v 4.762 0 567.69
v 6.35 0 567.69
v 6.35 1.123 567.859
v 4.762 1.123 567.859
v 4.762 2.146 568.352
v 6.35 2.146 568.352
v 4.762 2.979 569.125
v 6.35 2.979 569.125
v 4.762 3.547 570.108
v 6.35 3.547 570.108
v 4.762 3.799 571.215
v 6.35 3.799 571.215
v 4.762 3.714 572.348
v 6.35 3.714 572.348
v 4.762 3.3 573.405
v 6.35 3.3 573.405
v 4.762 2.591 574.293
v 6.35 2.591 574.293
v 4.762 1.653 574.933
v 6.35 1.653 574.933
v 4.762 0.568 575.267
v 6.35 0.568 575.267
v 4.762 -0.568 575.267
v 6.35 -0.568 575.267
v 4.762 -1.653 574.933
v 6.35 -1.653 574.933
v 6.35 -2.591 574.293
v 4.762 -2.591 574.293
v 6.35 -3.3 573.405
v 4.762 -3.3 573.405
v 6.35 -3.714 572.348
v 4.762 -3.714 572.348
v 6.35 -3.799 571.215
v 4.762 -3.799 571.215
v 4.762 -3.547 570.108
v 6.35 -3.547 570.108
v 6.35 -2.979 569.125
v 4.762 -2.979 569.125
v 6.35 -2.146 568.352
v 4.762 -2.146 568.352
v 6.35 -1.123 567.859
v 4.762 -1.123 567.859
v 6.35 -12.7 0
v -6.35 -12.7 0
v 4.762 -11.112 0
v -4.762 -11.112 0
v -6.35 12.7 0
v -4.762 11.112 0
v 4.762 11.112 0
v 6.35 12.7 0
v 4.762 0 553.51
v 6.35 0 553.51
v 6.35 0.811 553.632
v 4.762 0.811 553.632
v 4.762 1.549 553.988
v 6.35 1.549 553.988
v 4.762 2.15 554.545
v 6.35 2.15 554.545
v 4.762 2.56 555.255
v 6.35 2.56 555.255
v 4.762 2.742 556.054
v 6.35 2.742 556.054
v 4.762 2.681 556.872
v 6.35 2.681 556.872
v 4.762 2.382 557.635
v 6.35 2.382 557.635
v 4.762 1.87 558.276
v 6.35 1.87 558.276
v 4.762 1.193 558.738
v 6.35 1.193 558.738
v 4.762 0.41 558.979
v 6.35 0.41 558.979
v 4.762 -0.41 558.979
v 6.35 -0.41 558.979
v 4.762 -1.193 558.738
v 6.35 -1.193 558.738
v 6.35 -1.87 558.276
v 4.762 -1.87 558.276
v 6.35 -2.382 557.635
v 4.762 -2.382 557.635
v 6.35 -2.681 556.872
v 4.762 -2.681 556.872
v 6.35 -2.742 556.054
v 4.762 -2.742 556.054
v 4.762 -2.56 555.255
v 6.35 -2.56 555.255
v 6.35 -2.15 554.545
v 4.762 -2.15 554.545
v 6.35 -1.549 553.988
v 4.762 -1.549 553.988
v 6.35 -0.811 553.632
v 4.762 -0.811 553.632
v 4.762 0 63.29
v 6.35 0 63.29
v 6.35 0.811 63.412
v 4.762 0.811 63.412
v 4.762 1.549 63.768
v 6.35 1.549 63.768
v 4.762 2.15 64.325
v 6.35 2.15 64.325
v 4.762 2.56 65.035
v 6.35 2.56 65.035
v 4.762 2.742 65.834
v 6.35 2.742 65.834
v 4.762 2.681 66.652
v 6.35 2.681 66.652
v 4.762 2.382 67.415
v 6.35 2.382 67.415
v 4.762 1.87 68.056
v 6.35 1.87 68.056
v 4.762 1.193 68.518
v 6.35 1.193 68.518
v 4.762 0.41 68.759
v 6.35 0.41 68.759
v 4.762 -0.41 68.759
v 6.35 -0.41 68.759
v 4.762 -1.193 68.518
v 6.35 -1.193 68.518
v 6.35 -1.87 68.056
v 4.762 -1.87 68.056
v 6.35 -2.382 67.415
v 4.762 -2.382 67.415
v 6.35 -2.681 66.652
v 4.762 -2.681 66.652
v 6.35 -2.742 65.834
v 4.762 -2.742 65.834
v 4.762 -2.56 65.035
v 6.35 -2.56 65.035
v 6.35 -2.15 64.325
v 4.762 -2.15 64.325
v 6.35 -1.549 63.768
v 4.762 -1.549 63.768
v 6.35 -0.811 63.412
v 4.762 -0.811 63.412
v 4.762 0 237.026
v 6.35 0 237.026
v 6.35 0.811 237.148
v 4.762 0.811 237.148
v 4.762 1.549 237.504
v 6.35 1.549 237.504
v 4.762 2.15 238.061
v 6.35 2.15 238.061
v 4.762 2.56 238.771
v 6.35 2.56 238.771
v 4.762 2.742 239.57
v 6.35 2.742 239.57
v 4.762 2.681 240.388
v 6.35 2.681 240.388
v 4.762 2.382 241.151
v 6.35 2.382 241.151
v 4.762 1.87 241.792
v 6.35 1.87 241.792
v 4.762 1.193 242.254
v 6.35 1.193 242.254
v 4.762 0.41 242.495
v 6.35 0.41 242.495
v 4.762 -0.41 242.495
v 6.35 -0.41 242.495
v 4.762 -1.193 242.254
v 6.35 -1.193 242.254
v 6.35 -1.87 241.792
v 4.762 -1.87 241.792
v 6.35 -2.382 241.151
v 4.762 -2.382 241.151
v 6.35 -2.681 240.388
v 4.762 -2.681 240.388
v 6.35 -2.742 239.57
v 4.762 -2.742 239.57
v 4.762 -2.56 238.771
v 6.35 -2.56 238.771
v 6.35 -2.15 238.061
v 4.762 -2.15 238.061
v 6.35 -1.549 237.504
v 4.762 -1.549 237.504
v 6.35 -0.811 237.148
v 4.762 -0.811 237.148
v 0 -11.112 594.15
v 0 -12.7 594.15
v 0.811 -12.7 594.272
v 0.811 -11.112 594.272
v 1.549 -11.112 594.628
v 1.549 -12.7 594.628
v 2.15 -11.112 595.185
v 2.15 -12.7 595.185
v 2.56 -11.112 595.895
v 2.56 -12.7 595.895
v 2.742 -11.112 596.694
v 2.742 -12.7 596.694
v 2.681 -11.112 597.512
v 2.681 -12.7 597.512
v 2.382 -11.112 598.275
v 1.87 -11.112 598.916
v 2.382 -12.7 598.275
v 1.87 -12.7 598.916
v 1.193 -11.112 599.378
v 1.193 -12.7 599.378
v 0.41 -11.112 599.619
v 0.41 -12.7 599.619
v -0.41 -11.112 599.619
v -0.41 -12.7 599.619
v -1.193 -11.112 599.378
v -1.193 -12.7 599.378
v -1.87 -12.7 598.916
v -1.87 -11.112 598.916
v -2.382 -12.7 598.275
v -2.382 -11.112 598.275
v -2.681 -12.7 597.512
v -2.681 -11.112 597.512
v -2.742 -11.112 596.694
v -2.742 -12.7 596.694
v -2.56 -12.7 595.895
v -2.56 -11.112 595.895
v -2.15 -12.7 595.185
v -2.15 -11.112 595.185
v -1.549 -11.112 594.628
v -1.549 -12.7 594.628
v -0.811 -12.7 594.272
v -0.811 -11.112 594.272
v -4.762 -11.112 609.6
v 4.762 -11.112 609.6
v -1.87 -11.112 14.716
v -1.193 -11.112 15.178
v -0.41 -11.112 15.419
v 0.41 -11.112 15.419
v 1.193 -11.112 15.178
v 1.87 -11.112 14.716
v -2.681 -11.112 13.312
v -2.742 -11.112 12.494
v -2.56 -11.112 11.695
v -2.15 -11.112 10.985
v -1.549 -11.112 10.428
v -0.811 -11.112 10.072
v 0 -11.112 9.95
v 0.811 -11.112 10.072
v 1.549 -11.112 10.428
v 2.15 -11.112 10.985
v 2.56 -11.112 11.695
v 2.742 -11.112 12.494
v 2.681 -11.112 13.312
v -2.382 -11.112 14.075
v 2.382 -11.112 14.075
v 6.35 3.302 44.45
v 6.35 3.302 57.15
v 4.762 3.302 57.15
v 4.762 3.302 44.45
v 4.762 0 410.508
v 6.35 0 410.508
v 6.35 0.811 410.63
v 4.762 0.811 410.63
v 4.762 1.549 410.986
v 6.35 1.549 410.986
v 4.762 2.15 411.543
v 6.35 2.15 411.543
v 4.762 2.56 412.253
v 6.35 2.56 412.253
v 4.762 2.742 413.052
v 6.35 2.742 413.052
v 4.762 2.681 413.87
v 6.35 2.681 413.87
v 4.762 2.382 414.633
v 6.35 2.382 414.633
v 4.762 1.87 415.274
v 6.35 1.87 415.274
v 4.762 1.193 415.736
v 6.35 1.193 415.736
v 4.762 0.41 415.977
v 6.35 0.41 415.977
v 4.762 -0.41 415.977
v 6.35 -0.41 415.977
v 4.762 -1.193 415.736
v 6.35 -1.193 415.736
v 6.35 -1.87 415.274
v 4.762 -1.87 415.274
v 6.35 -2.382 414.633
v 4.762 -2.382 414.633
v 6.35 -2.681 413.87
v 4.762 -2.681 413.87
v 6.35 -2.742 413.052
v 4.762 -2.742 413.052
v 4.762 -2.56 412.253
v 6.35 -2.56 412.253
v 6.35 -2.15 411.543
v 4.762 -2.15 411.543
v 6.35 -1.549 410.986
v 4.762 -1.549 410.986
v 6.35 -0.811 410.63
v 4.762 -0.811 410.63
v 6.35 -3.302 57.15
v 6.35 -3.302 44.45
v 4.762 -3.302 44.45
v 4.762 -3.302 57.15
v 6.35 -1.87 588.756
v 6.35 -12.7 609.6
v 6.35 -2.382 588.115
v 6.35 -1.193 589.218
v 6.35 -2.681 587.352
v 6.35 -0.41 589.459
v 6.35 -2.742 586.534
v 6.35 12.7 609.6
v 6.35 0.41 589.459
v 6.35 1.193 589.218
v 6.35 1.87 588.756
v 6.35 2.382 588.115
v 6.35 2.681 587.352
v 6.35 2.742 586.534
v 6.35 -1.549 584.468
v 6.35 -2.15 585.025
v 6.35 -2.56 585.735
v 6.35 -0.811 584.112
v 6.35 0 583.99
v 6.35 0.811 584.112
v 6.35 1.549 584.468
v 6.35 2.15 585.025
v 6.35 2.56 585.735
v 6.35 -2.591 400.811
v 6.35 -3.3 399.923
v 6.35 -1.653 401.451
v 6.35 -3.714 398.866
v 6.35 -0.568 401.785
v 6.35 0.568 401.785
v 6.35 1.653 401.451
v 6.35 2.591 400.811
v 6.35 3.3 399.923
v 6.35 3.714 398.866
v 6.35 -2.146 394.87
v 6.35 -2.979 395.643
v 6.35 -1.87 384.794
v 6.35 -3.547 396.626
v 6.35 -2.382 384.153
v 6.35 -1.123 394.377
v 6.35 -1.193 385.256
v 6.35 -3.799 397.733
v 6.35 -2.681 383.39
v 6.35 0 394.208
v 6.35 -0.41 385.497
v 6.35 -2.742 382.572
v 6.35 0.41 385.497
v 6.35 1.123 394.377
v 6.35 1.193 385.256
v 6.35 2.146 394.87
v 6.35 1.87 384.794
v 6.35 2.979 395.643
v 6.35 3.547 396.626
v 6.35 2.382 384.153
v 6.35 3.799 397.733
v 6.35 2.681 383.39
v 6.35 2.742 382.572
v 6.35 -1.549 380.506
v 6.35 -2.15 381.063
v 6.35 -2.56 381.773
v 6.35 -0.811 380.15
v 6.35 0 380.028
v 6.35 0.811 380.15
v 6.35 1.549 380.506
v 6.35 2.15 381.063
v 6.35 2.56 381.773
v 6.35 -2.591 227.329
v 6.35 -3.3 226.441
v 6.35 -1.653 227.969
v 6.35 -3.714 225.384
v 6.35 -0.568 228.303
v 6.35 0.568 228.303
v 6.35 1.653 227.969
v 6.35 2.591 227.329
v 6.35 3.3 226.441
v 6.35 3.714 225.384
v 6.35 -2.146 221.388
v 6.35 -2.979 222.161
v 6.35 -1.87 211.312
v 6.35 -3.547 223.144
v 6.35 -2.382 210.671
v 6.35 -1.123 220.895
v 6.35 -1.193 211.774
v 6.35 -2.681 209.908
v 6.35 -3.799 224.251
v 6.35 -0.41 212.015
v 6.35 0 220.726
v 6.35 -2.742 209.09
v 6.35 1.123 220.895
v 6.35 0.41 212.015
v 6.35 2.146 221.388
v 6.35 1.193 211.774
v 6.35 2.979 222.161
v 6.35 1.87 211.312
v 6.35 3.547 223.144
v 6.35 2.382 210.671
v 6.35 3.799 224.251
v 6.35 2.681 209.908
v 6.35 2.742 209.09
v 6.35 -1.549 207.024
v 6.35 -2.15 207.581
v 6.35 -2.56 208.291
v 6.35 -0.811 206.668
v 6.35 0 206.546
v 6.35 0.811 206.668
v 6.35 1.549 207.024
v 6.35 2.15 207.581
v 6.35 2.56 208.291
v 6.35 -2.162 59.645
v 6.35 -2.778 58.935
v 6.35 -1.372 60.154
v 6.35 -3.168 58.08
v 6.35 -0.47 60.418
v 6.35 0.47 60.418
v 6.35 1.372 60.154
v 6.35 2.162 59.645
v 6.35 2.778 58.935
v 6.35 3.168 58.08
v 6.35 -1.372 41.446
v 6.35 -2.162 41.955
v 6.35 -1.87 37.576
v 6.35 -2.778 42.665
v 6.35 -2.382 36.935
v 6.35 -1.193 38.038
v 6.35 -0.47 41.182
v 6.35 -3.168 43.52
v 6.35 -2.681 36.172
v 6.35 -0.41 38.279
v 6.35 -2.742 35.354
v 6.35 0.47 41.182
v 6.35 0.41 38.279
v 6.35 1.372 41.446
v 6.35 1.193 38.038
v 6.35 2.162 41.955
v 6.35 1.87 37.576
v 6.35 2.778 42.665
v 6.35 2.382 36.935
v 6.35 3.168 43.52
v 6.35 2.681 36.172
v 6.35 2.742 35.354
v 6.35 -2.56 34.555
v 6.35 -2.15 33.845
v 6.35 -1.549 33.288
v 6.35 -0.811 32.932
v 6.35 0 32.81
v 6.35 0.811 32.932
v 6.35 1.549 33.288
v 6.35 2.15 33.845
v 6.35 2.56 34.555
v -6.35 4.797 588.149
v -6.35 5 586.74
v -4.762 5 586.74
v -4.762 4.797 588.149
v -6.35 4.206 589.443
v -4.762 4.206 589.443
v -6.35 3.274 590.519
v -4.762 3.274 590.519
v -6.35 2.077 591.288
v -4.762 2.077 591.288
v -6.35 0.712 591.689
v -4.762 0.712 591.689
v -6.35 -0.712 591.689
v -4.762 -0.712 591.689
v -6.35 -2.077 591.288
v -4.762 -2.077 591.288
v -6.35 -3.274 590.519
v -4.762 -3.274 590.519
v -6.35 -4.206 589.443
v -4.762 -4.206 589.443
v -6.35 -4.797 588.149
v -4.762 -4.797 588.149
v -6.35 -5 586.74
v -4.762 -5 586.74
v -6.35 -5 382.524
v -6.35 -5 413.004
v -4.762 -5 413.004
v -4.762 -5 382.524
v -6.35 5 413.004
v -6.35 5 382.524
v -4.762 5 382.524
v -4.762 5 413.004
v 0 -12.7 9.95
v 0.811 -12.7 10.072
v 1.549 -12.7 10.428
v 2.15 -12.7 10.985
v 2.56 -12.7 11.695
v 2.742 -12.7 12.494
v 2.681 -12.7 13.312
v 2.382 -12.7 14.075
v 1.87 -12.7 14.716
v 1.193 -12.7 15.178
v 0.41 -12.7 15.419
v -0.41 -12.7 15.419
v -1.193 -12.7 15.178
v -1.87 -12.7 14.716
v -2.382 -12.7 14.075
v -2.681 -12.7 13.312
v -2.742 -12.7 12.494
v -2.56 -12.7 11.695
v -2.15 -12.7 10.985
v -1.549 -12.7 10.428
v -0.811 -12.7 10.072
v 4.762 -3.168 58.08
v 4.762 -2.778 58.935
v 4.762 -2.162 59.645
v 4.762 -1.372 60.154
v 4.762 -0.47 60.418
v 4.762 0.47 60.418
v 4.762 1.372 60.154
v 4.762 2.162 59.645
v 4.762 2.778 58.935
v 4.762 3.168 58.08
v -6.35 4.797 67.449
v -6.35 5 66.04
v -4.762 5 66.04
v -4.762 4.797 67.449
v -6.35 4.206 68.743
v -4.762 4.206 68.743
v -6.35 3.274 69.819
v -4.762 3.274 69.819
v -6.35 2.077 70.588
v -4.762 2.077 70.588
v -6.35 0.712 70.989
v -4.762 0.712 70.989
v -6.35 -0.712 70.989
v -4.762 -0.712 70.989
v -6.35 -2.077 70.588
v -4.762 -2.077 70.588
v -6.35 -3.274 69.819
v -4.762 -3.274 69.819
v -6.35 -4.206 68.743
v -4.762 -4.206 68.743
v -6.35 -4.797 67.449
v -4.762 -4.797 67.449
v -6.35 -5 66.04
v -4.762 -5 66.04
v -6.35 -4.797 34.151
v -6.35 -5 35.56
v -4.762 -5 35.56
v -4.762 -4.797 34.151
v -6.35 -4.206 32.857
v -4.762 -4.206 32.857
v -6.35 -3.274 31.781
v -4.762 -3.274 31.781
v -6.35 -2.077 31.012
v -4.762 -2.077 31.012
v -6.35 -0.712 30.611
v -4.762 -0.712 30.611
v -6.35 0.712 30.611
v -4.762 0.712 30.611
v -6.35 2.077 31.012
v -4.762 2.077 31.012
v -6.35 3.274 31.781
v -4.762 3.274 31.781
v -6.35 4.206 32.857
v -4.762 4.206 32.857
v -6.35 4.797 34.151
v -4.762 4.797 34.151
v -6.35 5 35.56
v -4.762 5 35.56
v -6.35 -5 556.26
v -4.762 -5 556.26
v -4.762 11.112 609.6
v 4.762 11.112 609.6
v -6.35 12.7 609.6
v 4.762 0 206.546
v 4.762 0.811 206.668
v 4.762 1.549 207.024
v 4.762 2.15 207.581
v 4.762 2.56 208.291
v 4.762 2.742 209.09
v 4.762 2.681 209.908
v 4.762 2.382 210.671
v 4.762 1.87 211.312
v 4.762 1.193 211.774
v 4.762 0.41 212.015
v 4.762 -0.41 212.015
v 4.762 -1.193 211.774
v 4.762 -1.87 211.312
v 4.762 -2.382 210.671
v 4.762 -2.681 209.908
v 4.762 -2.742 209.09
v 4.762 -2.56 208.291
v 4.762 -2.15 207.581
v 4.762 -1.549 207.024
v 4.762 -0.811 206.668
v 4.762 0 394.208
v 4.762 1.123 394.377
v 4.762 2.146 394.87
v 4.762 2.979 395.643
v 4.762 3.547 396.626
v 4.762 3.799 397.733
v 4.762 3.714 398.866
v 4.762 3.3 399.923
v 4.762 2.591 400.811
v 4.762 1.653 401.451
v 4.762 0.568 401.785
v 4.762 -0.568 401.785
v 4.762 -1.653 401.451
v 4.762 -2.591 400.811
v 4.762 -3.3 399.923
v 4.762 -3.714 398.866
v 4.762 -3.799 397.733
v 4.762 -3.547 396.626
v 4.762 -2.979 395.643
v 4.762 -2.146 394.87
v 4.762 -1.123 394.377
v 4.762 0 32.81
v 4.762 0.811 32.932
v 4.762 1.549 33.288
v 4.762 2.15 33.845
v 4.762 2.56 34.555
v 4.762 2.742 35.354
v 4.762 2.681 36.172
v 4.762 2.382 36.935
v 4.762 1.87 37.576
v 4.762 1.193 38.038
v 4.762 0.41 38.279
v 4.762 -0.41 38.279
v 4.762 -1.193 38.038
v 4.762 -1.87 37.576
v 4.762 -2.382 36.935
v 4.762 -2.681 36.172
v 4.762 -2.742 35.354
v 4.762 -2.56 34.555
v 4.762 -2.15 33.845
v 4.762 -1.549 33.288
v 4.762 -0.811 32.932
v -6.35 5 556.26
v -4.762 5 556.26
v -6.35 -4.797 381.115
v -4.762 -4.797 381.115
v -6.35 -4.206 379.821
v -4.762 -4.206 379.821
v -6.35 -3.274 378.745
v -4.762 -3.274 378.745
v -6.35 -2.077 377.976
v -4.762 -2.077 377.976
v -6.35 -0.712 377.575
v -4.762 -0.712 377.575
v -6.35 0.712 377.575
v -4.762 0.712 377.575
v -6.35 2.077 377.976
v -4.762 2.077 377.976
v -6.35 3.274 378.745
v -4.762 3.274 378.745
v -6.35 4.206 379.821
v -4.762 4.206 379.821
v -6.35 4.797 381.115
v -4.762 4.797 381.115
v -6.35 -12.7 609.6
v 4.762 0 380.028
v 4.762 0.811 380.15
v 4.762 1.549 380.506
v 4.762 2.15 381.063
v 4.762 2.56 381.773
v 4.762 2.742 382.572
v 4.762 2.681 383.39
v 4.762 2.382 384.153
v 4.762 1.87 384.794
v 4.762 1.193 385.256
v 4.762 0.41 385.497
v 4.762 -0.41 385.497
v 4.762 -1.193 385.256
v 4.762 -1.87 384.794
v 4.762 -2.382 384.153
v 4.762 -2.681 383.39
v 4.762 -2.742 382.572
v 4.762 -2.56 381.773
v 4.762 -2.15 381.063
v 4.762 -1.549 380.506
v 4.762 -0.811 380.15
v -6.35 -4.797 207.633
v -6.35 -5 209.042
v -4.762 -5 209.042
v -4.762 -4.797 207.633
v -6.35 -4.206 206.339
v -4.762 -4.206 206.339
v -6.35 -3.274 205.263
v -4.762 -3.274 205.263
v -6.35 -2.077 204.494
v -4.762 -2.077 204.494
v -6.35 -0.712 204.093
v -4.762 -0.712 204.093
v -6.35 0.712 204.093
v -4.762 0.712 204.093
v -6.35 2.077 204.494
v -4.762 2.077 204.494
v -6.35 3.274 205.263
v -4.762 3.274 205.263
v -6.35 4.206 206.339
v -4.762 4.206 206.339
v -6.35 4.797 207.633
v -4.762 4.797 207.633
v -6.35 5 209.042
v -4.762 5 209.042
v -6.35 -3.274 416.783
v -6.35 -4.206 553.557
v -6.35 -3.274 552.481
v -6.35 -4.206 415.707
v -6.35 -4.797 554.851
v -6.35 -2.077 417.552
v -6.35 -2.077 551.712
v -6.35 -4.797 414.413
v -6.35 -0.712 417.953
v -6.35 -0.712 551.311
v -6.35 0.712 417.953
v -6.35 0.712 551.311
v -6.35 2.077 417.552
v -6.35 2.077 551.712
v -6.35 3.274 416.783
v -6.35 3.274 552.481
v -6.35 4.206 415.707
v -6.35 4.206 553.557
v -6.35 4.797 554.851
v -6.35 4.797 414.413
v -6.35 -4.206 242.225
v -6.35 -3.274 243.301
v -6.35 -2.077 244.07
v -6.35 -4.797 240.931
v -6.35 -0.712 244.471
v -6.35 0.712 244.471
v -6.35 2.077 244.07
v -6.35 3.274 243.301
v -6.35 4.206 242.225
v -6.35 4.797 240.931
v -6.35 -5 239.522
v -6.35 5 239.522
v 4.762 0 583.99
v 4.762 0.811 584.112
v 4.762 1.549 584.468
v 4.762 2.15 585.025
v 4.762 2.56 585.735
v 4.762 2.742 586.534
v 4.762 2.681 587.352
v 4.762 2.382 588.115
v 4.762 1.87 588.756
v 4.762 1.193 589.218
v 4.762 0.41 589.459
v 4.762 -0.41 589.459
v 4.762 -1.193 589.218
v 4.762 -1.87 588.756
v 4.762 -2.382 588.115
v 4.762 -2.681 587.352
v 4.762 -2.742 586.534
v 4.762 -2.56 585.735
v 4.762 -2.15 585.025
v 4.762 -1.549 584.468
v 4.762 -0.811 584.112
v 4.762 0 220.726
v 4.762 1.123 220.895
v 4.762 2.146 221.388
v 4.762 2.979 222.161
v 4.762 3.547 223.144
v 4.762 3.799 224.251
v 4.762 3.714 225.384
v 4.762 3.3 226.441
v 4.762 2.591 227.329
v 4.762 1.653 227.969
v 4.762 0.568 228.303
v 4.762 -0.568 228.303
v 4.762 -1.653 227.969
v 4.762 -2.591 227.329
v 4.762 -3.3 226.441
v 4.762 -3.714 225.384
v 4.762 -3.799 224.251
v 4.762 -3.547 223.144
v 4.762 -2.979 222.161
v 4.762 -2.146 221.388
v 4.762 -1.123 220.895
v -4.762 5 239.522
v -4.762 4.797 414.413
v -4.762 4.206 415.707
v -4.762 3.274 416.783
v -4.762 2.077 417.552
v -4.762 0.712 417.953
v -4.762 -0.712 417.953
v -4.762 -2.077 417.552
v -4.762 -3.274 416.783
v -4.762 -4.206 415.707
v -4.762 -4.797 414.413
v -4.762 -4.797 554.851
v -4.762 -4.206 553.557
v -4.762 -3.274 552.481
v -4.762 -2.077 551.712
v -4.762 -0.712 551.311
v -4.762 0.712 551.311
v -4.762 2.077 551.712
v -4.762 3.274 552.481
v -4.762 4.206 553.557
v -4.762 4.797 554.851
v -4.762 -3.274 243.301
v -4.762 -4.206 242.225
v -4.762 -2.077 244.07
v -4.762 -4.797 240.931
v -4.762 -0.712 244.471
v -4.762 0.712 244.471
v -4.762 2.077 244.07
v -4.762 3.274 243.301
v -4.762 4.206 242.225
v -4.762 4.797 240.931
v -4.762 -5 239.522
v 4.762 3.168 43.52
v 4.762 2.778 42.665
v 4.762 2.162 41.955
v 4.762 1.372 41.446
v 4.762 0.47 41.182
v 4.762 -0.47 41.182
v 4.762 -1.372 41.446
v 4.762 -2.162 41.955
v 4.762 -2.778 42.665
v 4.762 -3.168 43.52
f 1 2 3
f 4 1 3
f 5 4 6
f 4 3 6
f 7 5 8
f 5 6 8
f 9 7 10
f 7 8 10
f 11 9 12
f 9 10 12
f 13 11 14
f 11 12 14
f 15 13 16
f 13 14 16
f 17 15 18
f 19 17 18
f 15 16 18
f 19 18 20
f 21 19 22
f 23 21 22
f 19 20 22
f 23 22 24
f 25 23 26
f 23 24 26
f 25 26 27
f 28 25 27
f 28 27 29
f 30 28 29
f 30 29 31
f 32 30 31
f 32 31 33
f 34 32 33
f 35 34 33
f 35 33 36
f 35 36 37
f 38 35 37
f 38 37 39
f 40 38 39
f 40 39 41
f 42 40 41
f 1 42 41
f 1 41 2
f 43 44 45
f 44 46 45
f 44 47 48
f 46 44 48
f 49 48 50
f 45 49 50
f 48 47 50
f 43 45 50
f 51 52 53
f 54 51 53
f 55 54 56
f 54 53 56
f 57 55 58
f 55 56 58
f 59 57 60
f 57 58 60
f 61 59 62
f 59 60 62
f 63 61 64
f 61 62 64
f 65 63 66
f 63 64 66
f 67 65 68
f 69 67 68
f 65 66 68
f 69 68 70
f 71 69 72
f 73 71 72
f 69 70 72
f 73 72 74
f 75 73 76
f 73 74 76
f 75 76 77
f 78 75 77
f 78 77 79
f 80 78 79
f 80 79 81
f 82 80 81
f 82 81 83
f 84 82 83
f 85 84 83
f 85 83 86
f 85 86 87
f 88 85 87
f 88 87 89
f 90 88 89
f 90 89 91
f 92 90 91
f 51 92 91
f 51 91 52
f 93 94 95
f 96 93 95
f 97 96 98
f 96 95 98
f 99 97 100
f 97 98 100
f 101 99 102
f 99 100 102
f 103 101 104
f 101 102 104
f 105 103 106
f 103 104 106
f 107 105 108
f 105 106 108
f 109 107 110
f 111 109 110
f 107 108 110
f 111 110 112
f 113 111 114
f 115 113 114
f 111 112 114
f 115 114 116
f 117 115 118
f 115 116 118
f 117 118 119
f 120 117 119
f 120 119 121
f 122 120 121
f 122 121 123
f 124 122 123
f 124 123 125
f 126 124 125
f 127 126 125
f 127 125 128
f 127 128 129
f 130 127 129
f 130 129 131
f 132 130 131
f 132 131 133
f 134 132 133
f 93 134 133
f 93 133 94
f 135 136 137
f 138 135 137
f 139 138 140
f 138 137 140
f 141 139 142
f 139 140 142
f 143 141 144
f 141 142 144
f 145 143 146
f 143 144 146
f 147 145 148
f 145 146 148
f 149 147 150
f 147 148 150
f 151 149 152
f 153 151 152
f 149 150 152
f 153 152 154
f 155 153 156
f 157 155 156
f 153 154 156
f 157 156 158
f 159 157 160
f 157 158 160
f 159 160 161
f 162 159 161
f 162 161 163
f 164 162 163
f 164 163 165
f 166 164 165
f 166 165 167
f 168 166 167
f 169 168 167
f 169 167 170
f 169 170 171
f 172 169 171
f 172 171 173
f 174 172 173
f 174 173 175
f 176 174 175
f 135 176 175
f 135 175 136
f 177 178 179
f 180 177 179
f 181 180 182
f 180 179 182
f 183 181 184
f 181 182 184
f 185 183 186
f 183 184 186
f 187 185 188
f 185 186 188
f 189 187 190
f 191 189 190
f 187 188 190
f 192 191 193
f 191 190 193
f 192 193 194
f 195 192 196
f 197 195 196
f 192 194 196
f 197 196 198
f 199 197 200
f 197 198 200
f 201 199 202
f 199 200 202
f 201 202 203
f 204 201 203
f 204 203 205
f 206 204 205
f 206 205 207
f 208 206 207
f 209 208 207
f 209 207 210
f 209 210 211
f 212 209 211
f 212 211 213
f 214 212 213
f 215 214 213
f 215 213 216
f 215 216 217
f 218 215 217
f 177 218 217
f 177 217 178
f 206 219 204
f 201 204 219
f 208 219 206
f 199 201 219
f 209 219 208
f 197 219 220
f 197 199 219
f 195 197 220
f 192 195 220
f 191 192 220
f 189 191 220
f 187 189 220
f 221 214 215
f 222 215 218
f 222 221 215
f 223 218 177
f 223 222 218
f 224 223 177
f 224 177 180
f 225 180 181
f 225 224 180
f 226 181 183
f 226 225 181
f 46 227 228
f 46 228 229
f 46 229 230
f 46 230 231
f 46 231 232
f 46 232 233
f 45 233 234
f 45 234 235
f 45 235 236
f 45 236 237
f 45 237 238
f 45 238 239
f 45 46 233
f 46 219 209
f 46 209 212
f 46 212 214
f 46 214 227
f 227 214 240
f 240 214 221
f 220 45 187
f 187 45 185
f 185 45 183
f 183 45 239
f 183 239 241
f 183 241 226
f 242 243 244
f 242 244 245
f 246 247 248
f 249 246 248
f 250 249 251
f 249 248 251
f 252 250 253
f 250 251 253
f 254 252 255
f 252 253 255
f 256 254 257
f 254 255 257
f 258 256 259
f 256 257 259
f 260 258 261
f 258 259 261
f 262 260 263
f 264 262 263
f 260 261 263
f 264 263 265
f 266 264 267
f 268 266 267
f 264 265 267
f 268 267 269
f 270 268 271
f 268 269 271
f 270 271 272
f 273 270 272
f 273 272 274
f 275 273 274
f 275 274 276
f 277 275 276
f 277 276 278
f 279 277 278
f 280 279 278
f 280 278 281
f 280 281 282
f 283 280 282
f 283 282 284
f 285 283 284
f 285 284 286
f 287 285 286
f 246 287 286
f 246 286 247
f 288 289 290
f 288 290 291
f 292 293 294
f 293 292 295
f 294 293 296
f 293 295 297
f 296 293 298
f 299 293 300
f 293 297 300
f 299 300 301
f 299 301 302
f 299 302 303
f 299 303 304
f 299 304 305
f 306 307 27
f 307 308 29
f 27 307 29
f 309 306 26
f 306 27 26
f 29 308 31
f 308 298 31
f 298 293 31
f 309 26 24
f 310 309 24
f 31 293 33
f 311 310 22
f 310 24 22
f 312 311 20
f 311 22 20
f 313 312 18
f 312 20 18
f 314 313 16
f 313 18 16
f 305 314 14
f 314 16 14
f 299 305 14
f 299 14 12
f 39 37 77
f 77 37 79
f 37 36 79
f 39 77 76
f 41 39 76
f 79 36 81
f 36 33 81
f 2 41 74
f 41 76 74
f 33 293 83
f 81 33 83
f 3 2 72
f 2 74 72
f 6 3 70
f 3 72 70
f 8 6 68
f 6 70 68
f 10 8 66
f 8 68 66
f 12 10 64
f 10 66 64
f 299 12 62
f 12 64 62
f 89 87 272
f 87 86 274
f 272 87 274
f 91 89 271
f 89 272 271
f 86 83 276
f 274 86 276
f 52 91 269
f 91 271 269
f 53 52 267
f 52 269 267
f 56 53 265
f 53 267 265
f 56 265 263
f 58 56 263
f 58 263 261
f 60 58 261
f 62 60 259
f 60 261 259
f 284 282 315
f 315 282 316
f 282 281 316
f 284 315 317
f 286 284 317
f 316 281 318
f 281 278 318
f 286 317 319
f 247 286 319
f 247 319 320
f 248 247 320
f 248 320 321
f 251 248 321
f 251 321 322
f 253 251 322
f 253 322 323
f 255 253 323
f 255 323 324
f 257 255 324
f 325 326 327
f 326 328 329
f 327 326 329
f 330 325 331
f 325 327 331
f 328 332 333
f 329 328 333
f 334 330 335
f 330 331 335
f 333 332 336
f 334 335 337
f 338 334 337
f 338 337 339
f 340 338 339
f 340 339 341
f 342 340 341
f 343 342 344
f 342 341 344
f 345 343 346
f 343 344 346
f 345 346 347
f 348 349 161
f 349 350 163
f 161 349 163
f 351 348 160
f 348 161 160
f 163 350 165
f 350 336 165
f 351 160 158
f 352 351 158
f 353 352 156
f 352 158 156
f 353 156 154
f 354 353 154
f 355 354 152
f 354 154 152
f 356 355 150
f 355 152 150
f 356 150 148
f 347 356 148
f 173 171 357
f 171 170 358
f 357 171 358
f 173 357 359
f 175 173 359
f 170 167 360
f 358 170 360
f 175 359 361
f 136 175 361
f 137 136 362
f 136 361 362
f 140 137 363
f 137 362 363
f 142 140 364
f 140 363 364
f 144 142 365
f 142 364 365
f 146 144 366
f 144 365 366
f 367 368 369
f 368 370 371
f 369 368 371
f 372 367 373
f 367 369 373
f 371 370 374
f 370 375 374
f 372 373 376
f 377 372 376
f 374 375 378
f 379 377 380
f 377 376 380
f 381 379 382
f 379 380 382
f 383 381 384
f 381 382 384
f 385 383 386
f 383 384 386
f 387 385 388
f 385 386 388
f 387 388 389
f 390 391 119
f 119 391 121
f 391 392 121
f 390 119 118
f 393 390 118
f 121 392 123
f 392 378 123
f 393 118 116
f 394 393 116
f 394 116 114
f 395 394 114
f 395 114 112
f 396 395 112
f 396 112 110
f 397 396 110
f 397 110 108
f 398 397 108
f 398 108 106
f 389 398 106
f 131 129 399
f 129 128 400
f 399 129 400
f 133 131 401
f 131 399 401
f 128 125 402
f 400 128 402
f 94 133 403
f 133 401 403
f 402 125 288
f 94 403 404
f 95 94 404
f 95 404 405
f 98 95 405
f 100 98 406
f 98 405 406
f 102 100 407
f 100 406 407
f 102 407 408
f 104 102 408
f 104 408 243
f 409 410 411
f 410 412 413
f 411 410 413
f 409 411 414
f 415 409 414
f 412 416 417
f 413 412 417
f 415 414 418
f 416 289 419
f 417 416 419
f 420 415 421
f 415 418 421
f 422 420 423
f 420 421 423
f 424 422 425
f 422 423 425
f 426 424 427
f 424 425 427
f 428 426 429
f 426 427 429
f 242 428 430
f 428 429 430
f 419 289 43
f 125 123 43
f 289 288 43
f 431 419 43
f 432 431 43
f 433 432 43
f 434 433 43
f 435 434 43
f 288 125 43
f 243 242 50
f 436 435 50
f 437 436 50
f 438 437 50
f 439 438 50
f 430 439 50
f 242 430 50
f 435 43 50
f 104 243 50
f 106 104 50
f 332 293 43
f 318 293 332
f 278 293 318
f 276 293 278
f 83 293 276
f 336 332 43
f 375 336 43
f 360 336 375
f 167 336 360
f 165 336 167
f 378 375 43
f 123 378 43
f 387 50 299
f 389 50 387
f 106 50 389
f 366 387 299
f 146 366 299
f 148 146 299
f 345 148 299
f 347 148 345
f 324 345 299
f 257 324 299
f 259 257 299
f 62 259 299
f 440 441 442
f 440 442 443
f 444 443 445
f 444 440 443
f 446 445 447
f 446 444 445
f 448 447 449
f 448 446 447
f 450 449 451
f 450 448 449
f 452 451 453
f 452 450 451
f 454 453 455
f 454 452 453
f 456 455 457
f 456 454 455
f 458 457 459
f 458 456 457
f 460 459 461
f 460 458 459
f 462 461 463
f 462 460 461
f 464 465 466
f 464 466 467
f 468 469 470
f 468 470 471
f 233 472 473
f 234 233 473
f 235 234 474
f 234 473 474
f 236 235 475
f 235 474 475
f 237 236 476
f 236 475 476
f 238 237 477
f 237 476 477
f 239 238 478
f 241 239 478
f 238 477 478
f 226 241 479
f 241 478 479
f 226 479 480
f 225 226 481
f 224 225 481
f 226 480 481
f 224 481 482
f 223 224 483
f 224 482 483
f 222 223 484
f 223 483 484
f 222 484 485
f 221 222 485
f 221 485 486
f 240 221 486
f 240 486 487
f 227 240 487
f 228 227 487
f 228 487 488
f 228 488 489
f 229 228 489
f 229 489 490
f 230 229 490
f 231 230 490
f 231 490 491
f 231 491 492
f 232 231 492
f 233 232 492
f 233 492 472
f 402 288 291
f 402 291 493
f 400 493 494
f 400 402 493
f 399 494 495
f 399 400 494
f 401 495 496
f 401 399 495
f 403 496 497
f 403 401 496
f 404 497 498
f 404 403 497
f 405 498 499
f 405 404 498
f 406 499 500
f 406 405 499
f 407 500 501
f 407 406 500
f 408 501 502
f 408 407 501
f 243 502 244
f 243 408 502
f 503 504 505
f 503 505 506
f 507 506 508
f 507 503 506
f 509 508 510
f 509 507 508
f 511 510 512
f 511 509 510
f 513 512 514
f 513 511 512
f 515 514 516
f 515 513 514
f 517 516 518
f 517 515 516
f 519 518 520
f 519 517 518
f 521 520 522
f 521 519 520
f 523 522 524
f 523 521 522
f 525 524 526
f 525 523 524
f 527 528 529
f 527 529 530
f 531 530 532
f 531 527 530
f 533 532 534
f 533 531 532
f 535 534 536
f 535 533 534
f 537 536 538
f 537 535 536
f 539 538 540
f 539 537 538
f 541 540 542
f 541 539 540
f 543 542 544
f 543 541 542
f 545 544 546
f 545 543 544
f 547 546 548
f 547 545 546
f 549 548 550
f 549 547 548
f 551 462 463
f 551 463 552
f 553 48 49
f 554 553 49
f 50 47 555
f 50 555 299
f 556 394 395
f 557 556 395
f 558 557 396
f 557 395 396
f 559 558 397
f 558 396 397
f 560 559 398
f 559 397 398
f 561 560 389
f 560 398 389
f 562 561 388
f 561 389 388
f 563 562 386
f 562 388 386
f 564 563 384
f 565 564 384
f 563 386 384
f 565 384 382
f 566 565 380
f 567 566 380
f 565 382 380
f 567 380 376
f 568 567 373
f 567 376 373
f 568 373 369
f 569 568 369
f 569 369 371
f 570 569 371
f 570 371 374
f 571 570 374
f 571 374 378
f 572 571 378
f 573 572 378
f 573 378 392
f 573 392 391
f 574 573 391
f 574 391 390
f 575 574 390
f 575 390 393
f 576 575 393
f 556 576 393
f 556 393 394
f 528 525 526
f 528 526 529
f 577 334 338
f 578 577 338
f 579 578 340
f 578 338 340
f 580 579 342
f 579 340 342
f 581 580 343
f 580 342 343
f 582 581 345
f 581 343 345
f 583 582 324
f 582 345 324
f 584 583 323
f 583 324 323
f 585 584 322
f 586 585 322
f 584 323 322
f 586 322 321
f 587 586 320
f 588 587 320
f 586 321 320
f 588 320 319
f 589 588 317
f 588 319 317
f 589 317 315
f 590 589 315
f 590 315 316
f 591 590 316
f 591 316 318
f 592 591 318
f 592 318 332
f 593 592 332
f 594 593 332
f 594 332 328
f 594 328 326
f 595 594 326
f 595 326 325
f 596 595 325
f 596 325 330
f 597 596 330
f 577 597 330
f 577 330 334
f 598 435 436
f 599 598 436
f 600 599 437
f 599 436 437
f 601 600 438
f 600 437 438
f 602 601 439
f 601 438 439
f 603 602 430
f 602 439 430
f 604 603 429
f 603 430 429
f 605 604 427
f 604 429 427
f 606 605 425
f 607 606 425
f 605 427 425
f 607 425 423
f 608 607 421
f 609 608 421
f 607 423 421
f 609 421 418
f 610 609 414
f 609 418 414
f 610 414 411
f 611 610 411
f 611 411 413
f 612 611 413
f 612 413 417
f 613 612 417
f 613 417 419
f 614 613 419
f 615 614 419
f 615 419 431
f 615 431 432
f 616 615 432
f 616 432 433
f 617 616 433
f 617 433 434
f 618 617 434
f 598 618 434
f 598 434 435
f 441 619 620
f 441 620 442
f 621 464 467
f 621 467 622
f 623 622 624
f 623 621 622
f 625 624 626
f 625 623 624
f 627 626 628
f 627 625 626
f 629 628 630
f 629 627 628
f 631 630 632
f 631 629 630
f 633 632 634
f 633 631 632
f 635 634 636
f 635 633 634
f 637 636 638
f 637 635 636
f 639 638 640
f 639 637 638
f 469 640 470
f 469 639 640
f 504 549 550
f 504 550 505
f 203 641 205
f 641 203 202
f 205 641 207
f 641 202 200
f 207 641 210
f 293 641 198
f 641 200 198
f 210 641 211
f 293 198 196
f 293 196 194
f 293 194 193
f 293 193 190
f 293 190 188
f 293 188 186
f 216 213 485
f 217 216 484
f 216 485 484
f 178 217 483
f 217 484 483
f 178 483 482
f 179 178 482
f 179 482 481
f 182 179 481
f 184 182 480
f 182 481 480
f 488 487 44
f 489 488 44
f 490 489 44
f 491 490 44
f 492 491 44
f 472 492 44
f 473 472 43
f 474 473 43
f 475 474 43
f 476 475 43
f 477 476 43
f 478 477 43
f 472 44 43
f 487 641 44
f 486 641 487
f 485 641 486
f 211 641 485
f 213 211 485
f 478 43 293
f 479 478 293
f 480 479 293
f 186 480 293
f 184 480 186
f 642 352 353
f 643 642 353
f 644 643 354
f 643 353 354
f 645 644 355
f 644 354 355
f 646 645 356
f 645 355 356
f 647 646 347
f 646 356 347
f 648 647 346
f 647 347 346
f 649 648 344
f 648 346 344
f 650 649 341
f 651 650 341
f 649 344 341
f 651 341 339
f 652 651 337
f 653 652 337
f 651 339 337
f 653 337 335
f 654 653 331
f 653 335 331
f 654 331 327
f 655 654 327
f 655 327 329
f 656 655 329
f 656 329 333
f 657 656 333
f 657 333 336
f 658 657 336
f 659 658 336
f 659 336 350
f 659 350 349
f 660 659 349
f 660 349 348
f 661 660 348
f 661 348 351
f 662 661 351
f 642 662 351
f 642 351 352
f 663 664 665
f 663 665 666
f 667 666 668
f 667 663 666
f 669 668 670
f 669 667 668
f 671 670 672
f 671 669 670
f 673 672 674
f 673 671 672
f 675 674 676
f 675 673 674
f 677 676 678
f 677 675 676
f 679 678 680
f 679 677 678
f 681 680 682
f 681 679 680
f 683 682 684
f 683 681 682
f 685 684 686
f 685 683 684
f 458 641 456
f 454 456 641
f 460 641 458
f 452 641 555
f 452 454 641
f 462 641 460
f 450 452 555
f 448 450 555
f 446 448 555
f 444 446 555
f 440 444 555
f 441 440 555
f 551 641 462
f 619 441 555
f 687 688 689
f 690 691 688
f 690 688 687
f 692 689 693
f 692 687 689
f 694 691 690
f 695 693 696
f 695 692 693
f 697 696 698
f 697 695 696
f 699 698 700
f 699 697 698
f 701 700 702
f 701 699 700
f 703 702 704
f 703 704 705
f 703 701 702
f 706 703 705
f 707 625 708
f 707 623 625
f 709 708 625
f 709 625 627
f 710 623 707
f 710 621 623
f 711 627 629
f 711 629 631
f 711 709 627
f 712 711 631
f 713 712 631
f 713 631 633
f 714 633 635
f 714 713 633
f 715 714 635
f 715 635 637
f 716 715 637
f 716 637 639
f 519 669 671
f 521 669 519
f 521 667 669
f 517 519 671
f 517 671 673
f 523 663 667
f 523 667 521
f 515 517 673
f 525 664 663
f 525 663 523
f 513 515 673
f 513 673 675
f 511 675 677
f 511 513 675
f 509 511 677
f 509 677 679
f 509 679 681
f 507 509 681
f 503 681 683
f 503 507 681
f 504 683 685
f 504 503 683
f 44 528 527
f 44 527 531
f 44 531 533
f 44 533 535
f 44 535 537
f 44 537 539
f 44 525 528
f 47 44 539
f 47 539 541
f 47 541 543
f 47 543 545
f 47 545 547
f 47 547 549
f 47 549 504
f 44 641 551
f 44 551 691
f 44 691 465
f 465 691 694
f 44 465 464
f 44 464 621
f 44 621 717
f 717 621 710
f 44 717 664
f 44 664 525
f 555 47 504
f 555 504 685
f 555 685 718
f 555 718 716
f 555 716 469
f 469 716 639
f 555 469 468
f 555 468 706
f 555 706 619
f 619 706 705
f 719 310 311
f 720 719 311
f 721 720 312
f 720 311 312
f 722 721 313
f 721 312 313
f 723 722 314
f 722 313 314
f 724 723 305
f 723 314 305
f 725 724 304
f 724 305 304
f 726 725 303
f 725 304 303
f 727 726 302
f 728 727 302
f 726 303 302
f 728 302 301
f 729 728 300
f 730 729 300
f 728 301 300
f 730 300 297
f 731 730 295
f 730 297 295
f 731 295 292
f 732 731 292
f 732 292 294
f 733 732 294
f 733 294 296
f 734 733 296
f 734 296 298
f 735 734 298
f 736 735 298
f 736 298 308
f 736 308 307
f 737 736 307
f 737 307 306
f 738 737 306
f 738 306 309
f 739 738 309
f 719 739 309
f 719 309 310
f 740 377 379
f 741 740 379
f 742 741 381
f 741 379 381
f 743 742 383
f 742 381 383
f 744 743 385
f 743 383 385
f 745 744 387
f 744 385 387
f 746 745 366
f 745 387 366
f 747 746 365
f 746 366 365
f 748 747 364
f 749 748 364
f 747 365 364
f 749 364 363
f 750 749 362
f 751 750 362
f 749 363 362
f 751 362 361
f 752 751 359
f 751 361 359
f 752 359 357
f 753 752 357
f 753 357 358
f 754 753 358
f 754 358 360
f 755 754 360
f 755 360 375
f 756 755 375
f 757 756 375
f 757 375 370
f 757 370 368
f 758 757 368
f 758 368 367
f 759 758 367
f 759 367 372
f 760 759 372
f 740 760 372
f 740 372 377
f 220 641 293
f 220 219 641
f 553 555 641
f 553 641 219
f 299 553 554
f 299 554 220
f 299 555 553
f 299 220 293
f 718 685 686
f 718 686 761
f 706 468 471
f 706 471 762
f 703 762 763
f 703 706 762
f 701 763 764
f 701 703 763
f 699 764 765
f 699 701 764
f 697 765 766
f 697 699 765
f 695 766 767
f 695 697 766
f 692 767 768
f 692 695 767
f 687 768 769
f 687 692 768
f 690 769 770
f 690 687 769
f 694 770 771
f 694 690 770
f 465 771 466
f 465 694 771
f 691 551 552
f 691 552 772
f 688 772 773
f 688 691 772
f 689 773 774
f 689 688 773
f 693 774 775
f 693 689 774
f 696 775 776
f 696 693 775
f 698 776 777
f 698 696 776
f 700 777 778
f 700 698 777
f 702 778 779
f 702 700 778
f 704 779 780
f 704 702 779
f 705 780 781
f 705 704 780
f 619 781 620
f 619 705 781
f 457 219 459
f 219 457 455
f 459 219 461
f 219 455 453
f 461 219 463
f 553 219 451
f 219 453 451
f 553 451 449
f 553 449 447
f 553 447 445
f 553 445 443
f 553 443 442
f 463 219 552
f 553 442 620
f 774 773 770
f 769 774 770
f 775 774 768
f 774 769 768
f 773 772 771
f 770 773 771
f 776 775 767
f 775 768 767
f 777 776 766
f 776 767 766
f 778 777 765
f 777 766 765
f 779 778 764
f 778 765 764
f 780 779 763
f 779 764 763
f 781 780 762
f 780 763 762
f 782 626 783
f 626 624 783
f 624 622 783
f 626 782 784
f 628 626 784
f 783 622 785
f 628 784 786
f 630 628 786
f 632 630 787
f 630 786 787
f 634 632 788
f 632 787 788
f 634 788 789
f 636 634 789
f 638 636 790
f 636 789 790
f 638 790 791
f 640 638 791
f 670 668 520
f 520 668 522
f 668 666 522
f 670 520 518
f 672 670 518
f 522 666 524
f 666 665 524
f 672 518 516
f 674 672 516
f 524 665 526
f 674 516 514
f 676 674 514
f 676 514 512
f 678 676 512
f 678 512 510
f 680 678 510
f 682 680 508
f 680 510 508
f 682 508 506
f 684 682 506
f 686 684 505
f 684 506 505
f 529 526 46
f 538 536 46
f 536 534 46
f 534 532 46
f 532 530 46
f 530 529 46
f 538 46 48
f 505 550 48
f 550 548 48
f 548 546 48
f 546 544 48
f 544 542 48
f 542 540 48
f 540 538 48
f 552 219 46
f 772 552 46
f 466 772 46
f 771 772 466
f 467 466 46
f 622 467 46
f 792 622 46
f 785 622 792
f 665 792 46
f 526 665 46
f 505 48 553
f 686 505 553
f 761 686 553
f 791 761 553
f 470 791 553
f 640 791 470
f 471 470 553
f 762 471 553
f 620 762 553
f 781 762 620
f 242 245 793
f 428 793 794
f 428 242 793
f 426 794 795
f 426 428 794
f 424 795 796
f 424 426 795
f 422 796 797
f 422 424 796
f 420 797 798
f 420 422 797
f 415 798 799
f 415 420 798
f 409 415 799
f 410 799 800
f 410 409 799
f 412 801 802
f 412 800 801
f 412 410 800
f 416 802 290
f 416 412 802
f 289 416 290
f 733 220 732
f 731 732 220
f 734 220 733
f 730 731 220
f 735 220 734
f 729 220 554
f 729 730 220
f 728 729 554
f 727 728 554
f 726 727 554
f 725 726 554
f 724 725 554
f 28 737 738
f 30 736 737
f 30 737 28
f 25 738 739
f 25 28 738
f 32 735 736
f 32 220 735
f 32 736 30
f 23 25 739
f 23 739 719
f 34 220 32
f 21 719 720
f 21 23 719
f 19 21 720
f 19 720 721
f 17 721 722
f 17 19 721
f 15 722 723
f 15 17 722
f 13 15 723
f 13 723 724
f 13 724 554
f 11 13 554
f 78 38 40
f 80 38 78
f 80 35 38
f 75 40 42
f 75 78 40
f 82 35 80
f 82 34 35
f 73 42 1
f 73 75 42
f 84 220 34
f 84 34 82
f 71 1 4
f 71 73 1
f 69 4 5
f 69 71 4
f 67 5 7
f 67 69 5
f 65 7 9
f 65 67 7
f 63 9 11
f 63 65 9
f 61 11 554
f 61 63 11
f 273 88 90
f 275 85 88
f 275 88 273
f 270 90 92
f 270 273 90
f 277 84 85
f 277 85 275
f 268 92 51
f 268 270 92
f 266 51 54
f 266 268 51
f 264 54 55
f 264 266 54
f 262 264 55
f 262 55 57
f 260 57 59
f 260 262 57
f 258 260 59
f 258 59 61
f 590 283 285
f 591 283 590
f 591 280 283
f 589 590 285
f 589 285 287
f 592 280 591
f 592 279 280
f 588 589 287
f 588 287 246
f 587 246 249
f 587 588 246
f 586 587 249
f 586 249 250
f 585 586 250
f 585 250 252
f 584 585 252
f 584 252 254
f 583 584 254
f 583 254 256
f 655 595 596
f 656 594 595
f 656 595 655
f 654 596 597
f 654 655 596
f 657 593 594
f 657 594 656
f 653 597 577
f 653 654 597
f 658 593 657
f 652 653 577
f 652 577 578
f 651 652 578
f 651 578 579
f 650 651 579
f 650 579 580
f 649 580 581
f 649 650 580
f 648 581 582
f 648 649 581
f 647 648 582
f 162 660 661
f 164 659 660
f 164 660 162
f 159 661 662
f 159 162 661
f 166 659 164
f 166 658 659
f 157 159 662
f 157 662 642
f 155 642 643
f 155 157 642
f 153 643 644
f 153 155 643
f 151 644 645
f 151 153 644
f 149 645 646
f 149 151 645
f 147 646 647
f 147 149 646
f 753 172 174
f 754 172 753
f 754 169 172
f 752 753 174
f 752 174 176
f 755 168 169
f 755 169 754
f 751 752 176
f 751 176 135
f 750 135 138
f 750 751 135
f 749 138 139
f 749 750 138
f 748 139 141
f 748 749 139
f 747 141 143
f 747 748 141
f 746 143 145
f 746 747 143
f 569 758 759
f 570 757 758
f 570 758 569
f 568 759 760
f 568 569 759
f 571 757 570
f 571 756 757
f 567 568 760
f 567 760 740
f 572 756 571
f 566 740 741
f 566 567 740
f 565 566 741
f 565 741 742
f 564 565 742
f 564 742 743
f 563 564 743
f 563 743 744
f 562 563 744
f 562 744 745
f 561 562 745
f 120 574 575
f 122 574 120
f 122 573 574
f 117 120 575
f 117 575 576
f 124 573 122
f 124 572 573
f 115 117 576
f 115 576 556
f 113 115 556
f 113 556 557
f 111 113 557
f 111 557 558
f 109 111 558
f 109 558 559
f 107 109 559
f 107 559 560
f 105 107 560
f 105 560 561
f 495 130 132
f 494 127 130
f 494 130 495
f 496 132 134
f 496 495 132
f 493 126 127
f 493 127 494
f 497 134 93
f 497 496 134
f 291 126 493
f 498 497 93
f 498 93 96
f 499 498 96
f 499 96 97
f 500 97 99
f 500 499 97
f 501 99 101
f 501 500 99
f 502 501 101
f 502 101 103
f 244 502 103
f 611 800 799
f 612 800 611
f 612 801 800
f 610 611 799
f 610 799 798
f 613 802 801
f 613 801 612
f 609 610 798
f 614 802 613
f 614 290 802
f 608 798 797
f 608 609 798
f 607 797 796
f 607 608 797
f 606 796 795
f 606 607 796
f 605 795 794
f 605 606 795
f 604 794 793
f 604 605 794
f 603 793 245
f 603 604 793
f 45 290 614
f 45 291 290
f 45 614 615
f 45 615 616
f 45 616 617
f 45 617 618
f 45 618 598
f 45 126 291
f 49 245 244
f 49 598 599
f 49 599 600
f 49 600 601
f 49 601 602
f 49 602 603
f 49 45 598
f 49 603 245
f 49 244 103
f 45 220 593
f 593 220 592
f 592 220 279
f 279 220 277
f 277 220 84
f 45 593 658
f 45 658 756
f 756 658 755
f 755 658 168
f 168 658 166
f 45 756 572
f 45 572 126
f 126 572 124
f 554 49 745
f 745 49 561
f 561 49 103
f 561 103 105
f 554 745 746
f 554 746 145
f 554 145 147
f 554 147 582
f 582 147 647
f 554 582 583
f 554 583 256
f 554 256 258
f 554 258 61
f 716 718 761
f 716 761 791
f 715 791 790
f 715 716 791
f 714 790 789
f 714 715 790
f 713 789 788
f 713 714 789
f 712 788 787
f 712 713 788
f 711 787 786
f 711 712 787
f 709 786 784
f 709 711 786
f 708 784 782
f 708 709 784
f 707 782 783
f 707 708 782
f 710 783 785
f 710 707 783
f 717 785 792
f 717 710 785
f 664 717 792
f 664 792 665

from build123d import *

# Parameters (mm, degrees)
SKETCH1_W           = 12.7
SKETCH1_H           = 25.4
SKETCH1_W_2         = 9.525
SKETCH1_H_2         = 22.225
BOSS_EXTRUDE1_DEPTH = 609.6
SKETCH2_R           = 3.81
SKETCH2_R_2         = 2.75
CUT_EXTRUDE1_DEPTH  = 610.86452594
CUT_EXTRUDE3_REACH  = 611.865
CUT_EXTRUDE5_REACH  = 612.162
SKETCH5_R           = 2.75


with BuildPart() as part:
    # Sketch1 → Boss-Extrude1 (new body)
    with BuildSketch(Plane.XY):
        Rectangle(SKETCH1_W, SKETCH1_H)
        Rectangle(SKETCH1_W_2, SKETCH1_H_2, mode=Mode.SUBTRACT)
    extrude(amount=BOSS_EXTRUDE1_DEPTH)

    # Sketch2 → Cut-Extrude1 (cut, through all)
    with BuildSketch(Plane(origin=(6.35, 0, 0), x_dir=(0, 0, -1), z_dir=(1, 0, 0))):
        with Locations((-571.5, 0)):
            Circle(SKETCH2_R)
        with Locations((-586.74, 0)):
            Circle(SKETCH2_R_2)
        with Locations((-556.26, 0)):
            Circle(SKETCH2_R_2)
        with Locations((-66.04, 0)):
            Circle(SKETCH2_R_2)
        with Locations((-35.56, 0)):
            Circle(SKETCH2_R_2)
        with Locations((-382.778, 0)):
            Circle(SKETCH2_R_2)
        with Locations((-398.018, 0)):
            Circle(SKETCH2_R)
        with Locations((-413.258, 0)):
            Circle(SKETCH2_R_2)
        with Locations((-209.296, 0)):
            Circle(SKETCH2_R_2)
        with Locations((-224.536, 0)):
            Circle(SKETCH2_R)
        with Locations((-239.776, 0)):
            Circle(SKETCH2_R_2)
        with BuildLine():
            Line((-44.45, -3.302), (-57.15, -3.302))
            ThreePointArc((-57.15, -3.302), (-60.452, 0), (-57.15, 3.302))
            Line((-57.15, 3.302), (-44.45, 3.302))
            ThreePointArc((-44.45, 3.302), (-41.148, 0), (-44.45, -3.302))
        make_face()
    extrude(amount=-CUT_EXTRUDE1_DEPTH, mode=Mode.SUBTRACT)

    # Sketch4 → Cut-Extrude3 (cut, up to next)
    with BuildSketch(Plane.ZY.offset(6.35), mode=Mode.PRIVATE) as cut_extrude3_sk1:
        with BuildLine():
            Line((35.56, 5), (66.04, 5))
            ThreePointArc((66.04, 5), (71.04, 0), (66.04, -5))
            Line((66.04, -5), (35.56, -5))
            ThreePointArc((35.56, -5), (30.56, 0), (35.56, 5))
        make_face()
    cut_extrude3_tool1 = extrude(cut_extrude3_sk1.sketch, amount=-CUT_EXTRUDE3_REACH, mode=Mode.PRIVATE) & part.part
    # Sketch4 → Cut-Extrude3 (cut, up to next)
    with BuildSketch(Plane.ZY.offset(6.35), mode=Mode.PRIVATE) as cut_extrude3_sk2:
        with BuildLine():
            Line((556.26, 5), (586.74, 5))
            ThreePointArc((586.74, 5), (591.74, 0), (586.74, -5))
            Line((586.74, -5), (556.26, -5))
            ThreePointArc((556.26, -5), (551.26, 0), (556.26, 5))
        make_face()
    cut_extrude3_tool2 = extrude(cut_extrude3_sk2.sketch, amount=-CUT_EXTRUDE3_REACH, mode=Mode.PRIVATE) & part.part
    # Sketch4 → Cut-Extrude3 (cut, up to next)
    with BuildSketch(Plane.ZY.offset(6.35), mode=Mode.PRIVATE) as cut_extrude3_sk3:
        with BuildLine():
            Line((209.042, 5), (239.522, 5))
            ThreePointArc((239.522, 5), (244.522, 0), (239.522, -5))
            Line((239.522, -5), (209.042, -5))
            ThreePointArc((209.042, -5), (204.042, 0), (209.042, 5))
        make_face()
    cut_extrude3_tool3 = extrude(cut_extrude3_sk3.sketch, amount=-CUT_EXTRUDE3_REACH, mode=Mode.PRIVATE) & part.part
    # Sketch4 → Cut-Extrude3 (cut, up to next)
    with BuildSketch(Plane.ZY.offset(6.35), mode=Mode.PRIVATE) as cut_extrude3_sk4:
        with BuildLine():
            Line((382.524, 5), (413.004, 5))
            ThreePointArc((413.004, 5), (418.004, 0), (413.004, -5))
            Line((413.004, -5), (382.524, -5))
            ThreePointArc((382.524, -5), (377.524, 0), (382.524, 5))
        make_face()
    cut_extrude3_tool4 = extrude(cut_extrude3_sk4.sketch, amount=-CUT_EXTRUDE3_REACH, mode=Mode.PRIVATE) & part.part
    add(cut_extrude3_tool1.solids().sort_by_distance((-6.35, 0, 50.8))[0], mode=Mode.SUBTRACT)
    add(cut_extrude3_tool2.solids().sort_by_distance((-6.35, 0, 571.5))[0], mode=Mode.SUBTRACT)
    add(cut_extrude3_tool3.solids().sort_by_distance((-6.35, 0, 224.282))[0], mode=Mode.SUBTRACT)
    add(cut_extrude3_tool4.solids().sort_by_distance((-6.35, 0, 397.764))[0], mode=Mode.SUBTRACT)

    # Sketch5 → Cut-Extrude5 (cut, up to next)
    with BuildSketch(Plane.XZ.offset(12.7), mode=Mode.PRIVATE) as cut_extrude5_sk1:
        with Locations(Location((0, 596.9, 0), (0, 0, 270))):
            Circle(SKETCH5_R)
    cut_extrude5_tool1 = extrude(cut_extrude5_sk1.sketch, amount=-CUT_EXTRUDE5_REACH, mode=Mode.PRIVATE) & part.part
    # Sketch5 → Cut-Extrude5 (cut, up to next)
    with BuildSketch(Plane.XZ.offset(12.7), mode=Mode.PRIVATE) as cut_extrude5_sk2:
        with Locations(Location((0, 12.7, 0), (0, 0, 270))):
            Circle(SKETCH5_R)
    cut_extrude5_tool2 = extrude(cut_extrude5_sk2.sketch, amount=-CUT_EXTRUDE5_REACH, mode=Mode.PRIVATE) & part.part
    add(cut_extrude5_tool1.solids().sort_by_distance((0, -12.7, 596.9))[0], mode=Mode.SUBTRACT)
    add(cut_extrude5_tool2.solids().sort_by_distance((0, -12.7, 12.7))[0], mode=Mode.SUBTRACT)


solid = part.part
